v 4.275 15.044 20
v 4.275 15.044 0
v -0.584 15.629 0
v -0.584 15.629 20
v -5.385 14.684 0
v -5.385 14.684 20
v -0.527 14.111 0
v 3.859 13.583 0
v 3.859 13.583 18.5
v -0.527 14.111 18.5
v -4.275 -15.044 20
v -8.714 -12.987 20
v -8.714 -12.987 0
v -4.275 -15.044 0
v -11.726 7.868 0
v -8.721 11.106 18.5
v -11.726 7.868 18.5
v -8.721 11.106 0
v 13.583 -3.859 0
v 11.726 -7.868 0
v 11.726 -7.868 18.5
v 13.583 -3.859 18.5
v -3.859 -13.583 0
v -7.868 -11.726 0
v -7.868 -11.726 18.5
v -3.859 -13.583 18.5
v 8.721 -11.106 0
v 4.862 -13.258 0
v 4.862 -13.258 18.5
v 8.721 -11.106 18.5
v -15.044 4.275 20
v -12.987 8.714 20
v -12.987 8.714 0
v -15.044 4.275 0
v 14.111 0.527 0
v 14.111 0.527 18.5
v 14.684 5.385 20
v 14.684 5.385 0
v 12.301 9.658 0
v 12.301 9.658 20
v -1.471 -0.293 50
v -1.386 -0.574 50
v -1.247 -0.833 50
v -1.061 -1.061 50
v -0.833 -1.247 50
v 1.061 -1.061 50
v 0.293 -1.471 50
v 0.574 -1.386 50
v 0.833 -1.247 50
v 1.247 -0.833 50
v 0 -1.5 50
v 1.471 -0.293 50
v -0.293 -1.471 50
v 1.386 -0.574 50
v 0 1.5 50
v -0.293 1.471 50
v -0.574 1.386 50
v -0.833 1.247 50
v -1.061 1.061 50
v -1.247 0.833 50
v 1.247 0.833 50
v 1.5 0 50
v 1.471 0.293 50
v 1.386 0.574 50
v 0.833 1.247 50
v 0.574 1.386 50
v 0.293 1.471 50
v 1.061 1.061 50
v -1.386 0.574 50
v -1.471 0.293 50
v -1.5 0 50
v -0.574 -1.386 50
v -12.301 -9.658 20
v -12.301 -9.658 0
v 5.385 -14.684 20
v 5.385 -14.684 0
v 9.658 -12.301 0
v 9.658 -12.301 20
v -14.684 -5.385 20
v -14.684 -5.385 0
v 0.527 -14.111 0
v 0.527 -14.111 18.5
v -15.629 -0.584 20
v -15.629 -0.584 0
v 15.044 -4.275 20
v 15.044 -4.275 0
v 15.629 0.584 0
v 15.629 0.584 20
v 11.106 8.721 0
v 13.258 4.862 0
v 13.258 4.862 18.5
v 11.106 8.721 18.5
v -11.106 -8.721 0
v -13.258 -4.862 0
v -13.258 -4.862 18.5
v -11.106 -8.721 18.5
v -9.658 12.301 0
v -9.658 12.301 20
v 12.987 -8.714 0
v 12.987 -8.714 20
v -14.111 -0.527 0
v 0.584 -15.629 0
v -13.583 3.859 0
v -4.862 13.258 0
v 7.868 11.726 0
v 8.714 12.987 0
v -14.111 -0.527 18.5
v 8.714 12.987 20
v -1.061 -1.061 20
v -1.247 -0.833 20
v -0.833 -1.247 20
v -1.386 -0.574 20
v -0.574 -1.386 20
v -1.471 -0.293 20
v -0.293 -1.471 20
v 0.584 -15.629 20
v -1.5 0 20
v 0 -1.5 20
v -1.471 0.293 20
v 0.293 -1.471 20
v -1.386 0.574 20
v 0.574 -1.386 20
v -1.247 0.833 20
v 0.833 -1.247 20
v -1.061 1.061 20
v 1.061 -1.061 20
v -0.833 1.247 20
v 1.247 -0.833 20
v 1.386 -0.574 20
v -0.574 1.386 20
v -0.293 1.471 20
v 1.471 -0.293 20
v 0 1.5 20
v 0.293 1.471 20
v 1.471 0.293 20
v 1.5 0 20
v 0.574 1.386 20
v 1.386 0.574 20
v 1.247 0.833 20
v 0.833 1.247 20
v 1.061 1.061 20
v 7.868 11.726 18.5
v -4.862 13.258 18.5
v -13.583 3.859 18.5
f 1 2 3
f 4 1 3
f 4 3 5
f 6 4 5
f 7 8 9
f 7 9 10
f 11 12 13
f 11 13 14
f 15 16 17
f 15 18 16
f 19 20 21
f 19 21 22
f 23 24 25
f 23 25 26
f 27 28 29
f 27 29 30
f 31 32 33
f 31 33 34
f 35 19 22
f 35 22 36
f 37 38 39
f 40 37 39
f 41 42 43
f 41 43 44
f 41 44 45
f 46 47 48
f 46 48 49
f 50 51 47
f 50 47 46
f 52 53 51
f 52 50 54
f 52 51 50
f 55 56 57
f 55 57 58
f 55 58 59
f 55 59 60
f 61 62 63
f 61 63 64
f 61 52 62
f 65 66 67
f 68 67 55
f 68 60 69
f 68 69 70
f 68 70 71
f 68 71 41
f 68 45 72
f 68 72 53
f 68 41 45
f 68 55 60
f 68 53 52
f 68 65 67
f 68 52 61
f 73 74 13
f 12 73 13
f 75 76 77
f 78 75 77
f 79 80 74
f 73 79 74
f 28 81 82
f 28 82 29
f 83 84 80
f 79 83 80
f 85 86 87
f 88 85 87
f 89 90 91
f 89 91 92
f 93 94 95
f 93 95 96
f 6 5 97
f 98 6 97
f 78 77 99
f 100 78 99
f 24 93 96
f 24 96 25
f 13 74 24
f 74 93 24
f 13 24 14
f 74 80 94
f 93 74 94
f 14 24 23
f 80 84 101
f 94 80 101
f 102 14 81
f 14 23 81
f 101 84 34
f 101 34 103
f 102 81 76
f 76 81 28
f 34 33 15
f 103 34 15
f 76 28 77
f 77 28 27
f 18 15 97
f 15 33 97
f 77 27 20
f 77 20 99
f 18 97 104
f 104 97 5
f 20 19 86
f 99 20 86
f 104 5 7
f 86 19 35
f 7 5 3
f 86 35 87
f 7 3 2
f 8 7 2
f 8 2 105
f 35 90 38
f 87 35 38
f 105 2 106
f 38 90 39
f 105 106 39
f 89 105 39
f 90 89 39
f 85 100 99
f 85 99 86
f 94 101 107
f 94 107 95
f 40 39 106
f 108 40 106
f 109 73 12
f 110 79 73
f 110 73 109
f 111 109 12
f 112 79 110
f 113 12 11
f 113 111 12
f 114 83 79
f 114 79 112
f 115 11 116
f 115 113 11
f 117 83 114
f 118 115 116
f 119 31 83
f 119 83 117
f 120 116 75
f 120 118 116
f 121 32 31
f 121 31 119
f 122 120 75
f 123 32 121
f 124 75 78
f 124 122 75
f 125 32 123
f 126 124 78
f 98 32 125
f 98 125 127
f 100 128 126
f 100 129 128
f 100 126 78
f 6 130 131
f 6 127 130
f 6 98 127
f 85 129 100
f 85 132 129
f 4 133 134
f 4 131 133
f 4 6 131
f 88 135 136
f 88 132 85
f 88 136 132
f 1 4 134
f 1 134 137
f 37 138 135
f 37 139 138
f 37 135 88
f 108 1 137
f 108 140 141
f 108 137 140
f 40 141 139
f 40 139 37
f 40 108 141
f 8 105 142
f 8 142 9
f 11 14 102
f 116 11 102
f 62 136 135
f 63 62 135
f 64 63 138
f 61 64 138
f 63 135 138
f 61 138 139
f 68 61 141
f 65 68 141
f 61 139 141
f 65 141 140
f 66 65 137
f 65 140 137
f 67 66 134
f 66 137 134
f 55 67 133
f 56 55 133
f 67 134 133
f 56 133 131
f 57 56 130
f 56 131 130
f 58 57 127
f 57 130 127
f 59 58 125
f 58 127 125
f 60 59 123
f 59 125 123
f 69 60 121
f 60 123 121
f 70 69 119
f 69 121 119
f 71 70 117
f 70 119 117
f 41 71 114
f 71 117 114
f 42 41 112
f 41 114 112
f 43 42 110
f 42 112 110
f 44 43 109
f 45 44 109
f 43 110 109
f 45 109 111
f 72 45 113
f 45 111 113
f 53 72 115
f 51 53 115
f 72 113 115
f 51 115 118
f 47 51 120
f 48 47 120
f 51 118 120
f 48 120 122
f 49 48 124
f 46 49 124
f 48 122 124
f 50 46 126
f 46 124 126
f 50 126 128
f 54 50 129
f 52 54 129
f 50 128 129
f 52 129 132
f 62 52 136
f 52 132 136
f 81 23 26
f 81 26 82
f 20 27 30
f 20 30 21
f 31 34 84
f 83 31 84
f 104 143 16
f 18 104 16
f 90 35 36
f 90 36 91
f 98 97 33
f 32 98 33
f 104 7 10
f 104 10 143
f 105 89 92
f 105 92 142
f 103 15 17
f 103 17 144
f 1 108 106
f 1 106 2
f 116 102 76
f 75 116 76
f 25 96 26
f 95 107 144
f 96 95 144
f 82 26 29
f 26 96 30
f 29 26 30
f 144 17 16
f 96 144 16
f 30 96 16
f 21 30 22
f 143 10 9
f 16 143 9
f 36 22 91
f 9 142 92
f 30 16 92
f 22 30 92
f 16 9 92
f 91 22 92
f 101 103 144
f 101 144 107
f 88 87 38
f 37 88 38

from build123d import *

# Parameters (mm, degrees)
RESSALTO_EXTRUS_O1_DEPTH = 20
CASCA1_T                 = -1.5
ESBO_O2_R                = 1.5
RESSALTO_EXTRUS_O2_DEPTH = 30


with BuildPart() as part:
    # Esboço1 → Ressalto-extrusão1 (new body)
    with BuildSketch(Plane.XY):
        Polygon((-12.986930378, 8.7142726), (-15.044163089, 4.274583549), (-15.628768299, -0.583531522), (-14.683520775, -5.384526462), (-12.300947932, -9.658446435), (-8.7142726, -12.986930378), (-4.274583549, -15.044163089), (0.583531522, -15.628768299), (5.384526462, -14.683520775), (9.658446435, -12.300947932), (12.986930378, -8.7142726), (15.044163089, -4.274583549), (15.628768299, 0.583531522), (14.683520775, 5.384526462), (12.300947932, 9.658446435), (8.7142726, 12.986930378), (4.274583549, 15.044163089), (-0.583531522, 15.628768299), (-5.384526462, 14.683520775), (-9.658446435, 12.300947932), align=None)
    extrude(amount=RESSALTO_EXTRUS_O1_DEPTH)

    # Casca1
    casca1_openings = [part.faces().sort_by_distance(p)[0] for p in [
        (0, 0, 0),
    ]]
    offset(amount=CASCA1_T, openings=casca1_openings, kind=Kind.INTERSECTION)

    # Esboço2 → Ressalto-extrusão2 (add)
    with BuildSketch(Plane.XY.offset(20)):
        Circle(ESBO_O2_R)
    extrude(amount=RESSALTO_EXTRUS_O2_DEPTH)


solid = part.part
